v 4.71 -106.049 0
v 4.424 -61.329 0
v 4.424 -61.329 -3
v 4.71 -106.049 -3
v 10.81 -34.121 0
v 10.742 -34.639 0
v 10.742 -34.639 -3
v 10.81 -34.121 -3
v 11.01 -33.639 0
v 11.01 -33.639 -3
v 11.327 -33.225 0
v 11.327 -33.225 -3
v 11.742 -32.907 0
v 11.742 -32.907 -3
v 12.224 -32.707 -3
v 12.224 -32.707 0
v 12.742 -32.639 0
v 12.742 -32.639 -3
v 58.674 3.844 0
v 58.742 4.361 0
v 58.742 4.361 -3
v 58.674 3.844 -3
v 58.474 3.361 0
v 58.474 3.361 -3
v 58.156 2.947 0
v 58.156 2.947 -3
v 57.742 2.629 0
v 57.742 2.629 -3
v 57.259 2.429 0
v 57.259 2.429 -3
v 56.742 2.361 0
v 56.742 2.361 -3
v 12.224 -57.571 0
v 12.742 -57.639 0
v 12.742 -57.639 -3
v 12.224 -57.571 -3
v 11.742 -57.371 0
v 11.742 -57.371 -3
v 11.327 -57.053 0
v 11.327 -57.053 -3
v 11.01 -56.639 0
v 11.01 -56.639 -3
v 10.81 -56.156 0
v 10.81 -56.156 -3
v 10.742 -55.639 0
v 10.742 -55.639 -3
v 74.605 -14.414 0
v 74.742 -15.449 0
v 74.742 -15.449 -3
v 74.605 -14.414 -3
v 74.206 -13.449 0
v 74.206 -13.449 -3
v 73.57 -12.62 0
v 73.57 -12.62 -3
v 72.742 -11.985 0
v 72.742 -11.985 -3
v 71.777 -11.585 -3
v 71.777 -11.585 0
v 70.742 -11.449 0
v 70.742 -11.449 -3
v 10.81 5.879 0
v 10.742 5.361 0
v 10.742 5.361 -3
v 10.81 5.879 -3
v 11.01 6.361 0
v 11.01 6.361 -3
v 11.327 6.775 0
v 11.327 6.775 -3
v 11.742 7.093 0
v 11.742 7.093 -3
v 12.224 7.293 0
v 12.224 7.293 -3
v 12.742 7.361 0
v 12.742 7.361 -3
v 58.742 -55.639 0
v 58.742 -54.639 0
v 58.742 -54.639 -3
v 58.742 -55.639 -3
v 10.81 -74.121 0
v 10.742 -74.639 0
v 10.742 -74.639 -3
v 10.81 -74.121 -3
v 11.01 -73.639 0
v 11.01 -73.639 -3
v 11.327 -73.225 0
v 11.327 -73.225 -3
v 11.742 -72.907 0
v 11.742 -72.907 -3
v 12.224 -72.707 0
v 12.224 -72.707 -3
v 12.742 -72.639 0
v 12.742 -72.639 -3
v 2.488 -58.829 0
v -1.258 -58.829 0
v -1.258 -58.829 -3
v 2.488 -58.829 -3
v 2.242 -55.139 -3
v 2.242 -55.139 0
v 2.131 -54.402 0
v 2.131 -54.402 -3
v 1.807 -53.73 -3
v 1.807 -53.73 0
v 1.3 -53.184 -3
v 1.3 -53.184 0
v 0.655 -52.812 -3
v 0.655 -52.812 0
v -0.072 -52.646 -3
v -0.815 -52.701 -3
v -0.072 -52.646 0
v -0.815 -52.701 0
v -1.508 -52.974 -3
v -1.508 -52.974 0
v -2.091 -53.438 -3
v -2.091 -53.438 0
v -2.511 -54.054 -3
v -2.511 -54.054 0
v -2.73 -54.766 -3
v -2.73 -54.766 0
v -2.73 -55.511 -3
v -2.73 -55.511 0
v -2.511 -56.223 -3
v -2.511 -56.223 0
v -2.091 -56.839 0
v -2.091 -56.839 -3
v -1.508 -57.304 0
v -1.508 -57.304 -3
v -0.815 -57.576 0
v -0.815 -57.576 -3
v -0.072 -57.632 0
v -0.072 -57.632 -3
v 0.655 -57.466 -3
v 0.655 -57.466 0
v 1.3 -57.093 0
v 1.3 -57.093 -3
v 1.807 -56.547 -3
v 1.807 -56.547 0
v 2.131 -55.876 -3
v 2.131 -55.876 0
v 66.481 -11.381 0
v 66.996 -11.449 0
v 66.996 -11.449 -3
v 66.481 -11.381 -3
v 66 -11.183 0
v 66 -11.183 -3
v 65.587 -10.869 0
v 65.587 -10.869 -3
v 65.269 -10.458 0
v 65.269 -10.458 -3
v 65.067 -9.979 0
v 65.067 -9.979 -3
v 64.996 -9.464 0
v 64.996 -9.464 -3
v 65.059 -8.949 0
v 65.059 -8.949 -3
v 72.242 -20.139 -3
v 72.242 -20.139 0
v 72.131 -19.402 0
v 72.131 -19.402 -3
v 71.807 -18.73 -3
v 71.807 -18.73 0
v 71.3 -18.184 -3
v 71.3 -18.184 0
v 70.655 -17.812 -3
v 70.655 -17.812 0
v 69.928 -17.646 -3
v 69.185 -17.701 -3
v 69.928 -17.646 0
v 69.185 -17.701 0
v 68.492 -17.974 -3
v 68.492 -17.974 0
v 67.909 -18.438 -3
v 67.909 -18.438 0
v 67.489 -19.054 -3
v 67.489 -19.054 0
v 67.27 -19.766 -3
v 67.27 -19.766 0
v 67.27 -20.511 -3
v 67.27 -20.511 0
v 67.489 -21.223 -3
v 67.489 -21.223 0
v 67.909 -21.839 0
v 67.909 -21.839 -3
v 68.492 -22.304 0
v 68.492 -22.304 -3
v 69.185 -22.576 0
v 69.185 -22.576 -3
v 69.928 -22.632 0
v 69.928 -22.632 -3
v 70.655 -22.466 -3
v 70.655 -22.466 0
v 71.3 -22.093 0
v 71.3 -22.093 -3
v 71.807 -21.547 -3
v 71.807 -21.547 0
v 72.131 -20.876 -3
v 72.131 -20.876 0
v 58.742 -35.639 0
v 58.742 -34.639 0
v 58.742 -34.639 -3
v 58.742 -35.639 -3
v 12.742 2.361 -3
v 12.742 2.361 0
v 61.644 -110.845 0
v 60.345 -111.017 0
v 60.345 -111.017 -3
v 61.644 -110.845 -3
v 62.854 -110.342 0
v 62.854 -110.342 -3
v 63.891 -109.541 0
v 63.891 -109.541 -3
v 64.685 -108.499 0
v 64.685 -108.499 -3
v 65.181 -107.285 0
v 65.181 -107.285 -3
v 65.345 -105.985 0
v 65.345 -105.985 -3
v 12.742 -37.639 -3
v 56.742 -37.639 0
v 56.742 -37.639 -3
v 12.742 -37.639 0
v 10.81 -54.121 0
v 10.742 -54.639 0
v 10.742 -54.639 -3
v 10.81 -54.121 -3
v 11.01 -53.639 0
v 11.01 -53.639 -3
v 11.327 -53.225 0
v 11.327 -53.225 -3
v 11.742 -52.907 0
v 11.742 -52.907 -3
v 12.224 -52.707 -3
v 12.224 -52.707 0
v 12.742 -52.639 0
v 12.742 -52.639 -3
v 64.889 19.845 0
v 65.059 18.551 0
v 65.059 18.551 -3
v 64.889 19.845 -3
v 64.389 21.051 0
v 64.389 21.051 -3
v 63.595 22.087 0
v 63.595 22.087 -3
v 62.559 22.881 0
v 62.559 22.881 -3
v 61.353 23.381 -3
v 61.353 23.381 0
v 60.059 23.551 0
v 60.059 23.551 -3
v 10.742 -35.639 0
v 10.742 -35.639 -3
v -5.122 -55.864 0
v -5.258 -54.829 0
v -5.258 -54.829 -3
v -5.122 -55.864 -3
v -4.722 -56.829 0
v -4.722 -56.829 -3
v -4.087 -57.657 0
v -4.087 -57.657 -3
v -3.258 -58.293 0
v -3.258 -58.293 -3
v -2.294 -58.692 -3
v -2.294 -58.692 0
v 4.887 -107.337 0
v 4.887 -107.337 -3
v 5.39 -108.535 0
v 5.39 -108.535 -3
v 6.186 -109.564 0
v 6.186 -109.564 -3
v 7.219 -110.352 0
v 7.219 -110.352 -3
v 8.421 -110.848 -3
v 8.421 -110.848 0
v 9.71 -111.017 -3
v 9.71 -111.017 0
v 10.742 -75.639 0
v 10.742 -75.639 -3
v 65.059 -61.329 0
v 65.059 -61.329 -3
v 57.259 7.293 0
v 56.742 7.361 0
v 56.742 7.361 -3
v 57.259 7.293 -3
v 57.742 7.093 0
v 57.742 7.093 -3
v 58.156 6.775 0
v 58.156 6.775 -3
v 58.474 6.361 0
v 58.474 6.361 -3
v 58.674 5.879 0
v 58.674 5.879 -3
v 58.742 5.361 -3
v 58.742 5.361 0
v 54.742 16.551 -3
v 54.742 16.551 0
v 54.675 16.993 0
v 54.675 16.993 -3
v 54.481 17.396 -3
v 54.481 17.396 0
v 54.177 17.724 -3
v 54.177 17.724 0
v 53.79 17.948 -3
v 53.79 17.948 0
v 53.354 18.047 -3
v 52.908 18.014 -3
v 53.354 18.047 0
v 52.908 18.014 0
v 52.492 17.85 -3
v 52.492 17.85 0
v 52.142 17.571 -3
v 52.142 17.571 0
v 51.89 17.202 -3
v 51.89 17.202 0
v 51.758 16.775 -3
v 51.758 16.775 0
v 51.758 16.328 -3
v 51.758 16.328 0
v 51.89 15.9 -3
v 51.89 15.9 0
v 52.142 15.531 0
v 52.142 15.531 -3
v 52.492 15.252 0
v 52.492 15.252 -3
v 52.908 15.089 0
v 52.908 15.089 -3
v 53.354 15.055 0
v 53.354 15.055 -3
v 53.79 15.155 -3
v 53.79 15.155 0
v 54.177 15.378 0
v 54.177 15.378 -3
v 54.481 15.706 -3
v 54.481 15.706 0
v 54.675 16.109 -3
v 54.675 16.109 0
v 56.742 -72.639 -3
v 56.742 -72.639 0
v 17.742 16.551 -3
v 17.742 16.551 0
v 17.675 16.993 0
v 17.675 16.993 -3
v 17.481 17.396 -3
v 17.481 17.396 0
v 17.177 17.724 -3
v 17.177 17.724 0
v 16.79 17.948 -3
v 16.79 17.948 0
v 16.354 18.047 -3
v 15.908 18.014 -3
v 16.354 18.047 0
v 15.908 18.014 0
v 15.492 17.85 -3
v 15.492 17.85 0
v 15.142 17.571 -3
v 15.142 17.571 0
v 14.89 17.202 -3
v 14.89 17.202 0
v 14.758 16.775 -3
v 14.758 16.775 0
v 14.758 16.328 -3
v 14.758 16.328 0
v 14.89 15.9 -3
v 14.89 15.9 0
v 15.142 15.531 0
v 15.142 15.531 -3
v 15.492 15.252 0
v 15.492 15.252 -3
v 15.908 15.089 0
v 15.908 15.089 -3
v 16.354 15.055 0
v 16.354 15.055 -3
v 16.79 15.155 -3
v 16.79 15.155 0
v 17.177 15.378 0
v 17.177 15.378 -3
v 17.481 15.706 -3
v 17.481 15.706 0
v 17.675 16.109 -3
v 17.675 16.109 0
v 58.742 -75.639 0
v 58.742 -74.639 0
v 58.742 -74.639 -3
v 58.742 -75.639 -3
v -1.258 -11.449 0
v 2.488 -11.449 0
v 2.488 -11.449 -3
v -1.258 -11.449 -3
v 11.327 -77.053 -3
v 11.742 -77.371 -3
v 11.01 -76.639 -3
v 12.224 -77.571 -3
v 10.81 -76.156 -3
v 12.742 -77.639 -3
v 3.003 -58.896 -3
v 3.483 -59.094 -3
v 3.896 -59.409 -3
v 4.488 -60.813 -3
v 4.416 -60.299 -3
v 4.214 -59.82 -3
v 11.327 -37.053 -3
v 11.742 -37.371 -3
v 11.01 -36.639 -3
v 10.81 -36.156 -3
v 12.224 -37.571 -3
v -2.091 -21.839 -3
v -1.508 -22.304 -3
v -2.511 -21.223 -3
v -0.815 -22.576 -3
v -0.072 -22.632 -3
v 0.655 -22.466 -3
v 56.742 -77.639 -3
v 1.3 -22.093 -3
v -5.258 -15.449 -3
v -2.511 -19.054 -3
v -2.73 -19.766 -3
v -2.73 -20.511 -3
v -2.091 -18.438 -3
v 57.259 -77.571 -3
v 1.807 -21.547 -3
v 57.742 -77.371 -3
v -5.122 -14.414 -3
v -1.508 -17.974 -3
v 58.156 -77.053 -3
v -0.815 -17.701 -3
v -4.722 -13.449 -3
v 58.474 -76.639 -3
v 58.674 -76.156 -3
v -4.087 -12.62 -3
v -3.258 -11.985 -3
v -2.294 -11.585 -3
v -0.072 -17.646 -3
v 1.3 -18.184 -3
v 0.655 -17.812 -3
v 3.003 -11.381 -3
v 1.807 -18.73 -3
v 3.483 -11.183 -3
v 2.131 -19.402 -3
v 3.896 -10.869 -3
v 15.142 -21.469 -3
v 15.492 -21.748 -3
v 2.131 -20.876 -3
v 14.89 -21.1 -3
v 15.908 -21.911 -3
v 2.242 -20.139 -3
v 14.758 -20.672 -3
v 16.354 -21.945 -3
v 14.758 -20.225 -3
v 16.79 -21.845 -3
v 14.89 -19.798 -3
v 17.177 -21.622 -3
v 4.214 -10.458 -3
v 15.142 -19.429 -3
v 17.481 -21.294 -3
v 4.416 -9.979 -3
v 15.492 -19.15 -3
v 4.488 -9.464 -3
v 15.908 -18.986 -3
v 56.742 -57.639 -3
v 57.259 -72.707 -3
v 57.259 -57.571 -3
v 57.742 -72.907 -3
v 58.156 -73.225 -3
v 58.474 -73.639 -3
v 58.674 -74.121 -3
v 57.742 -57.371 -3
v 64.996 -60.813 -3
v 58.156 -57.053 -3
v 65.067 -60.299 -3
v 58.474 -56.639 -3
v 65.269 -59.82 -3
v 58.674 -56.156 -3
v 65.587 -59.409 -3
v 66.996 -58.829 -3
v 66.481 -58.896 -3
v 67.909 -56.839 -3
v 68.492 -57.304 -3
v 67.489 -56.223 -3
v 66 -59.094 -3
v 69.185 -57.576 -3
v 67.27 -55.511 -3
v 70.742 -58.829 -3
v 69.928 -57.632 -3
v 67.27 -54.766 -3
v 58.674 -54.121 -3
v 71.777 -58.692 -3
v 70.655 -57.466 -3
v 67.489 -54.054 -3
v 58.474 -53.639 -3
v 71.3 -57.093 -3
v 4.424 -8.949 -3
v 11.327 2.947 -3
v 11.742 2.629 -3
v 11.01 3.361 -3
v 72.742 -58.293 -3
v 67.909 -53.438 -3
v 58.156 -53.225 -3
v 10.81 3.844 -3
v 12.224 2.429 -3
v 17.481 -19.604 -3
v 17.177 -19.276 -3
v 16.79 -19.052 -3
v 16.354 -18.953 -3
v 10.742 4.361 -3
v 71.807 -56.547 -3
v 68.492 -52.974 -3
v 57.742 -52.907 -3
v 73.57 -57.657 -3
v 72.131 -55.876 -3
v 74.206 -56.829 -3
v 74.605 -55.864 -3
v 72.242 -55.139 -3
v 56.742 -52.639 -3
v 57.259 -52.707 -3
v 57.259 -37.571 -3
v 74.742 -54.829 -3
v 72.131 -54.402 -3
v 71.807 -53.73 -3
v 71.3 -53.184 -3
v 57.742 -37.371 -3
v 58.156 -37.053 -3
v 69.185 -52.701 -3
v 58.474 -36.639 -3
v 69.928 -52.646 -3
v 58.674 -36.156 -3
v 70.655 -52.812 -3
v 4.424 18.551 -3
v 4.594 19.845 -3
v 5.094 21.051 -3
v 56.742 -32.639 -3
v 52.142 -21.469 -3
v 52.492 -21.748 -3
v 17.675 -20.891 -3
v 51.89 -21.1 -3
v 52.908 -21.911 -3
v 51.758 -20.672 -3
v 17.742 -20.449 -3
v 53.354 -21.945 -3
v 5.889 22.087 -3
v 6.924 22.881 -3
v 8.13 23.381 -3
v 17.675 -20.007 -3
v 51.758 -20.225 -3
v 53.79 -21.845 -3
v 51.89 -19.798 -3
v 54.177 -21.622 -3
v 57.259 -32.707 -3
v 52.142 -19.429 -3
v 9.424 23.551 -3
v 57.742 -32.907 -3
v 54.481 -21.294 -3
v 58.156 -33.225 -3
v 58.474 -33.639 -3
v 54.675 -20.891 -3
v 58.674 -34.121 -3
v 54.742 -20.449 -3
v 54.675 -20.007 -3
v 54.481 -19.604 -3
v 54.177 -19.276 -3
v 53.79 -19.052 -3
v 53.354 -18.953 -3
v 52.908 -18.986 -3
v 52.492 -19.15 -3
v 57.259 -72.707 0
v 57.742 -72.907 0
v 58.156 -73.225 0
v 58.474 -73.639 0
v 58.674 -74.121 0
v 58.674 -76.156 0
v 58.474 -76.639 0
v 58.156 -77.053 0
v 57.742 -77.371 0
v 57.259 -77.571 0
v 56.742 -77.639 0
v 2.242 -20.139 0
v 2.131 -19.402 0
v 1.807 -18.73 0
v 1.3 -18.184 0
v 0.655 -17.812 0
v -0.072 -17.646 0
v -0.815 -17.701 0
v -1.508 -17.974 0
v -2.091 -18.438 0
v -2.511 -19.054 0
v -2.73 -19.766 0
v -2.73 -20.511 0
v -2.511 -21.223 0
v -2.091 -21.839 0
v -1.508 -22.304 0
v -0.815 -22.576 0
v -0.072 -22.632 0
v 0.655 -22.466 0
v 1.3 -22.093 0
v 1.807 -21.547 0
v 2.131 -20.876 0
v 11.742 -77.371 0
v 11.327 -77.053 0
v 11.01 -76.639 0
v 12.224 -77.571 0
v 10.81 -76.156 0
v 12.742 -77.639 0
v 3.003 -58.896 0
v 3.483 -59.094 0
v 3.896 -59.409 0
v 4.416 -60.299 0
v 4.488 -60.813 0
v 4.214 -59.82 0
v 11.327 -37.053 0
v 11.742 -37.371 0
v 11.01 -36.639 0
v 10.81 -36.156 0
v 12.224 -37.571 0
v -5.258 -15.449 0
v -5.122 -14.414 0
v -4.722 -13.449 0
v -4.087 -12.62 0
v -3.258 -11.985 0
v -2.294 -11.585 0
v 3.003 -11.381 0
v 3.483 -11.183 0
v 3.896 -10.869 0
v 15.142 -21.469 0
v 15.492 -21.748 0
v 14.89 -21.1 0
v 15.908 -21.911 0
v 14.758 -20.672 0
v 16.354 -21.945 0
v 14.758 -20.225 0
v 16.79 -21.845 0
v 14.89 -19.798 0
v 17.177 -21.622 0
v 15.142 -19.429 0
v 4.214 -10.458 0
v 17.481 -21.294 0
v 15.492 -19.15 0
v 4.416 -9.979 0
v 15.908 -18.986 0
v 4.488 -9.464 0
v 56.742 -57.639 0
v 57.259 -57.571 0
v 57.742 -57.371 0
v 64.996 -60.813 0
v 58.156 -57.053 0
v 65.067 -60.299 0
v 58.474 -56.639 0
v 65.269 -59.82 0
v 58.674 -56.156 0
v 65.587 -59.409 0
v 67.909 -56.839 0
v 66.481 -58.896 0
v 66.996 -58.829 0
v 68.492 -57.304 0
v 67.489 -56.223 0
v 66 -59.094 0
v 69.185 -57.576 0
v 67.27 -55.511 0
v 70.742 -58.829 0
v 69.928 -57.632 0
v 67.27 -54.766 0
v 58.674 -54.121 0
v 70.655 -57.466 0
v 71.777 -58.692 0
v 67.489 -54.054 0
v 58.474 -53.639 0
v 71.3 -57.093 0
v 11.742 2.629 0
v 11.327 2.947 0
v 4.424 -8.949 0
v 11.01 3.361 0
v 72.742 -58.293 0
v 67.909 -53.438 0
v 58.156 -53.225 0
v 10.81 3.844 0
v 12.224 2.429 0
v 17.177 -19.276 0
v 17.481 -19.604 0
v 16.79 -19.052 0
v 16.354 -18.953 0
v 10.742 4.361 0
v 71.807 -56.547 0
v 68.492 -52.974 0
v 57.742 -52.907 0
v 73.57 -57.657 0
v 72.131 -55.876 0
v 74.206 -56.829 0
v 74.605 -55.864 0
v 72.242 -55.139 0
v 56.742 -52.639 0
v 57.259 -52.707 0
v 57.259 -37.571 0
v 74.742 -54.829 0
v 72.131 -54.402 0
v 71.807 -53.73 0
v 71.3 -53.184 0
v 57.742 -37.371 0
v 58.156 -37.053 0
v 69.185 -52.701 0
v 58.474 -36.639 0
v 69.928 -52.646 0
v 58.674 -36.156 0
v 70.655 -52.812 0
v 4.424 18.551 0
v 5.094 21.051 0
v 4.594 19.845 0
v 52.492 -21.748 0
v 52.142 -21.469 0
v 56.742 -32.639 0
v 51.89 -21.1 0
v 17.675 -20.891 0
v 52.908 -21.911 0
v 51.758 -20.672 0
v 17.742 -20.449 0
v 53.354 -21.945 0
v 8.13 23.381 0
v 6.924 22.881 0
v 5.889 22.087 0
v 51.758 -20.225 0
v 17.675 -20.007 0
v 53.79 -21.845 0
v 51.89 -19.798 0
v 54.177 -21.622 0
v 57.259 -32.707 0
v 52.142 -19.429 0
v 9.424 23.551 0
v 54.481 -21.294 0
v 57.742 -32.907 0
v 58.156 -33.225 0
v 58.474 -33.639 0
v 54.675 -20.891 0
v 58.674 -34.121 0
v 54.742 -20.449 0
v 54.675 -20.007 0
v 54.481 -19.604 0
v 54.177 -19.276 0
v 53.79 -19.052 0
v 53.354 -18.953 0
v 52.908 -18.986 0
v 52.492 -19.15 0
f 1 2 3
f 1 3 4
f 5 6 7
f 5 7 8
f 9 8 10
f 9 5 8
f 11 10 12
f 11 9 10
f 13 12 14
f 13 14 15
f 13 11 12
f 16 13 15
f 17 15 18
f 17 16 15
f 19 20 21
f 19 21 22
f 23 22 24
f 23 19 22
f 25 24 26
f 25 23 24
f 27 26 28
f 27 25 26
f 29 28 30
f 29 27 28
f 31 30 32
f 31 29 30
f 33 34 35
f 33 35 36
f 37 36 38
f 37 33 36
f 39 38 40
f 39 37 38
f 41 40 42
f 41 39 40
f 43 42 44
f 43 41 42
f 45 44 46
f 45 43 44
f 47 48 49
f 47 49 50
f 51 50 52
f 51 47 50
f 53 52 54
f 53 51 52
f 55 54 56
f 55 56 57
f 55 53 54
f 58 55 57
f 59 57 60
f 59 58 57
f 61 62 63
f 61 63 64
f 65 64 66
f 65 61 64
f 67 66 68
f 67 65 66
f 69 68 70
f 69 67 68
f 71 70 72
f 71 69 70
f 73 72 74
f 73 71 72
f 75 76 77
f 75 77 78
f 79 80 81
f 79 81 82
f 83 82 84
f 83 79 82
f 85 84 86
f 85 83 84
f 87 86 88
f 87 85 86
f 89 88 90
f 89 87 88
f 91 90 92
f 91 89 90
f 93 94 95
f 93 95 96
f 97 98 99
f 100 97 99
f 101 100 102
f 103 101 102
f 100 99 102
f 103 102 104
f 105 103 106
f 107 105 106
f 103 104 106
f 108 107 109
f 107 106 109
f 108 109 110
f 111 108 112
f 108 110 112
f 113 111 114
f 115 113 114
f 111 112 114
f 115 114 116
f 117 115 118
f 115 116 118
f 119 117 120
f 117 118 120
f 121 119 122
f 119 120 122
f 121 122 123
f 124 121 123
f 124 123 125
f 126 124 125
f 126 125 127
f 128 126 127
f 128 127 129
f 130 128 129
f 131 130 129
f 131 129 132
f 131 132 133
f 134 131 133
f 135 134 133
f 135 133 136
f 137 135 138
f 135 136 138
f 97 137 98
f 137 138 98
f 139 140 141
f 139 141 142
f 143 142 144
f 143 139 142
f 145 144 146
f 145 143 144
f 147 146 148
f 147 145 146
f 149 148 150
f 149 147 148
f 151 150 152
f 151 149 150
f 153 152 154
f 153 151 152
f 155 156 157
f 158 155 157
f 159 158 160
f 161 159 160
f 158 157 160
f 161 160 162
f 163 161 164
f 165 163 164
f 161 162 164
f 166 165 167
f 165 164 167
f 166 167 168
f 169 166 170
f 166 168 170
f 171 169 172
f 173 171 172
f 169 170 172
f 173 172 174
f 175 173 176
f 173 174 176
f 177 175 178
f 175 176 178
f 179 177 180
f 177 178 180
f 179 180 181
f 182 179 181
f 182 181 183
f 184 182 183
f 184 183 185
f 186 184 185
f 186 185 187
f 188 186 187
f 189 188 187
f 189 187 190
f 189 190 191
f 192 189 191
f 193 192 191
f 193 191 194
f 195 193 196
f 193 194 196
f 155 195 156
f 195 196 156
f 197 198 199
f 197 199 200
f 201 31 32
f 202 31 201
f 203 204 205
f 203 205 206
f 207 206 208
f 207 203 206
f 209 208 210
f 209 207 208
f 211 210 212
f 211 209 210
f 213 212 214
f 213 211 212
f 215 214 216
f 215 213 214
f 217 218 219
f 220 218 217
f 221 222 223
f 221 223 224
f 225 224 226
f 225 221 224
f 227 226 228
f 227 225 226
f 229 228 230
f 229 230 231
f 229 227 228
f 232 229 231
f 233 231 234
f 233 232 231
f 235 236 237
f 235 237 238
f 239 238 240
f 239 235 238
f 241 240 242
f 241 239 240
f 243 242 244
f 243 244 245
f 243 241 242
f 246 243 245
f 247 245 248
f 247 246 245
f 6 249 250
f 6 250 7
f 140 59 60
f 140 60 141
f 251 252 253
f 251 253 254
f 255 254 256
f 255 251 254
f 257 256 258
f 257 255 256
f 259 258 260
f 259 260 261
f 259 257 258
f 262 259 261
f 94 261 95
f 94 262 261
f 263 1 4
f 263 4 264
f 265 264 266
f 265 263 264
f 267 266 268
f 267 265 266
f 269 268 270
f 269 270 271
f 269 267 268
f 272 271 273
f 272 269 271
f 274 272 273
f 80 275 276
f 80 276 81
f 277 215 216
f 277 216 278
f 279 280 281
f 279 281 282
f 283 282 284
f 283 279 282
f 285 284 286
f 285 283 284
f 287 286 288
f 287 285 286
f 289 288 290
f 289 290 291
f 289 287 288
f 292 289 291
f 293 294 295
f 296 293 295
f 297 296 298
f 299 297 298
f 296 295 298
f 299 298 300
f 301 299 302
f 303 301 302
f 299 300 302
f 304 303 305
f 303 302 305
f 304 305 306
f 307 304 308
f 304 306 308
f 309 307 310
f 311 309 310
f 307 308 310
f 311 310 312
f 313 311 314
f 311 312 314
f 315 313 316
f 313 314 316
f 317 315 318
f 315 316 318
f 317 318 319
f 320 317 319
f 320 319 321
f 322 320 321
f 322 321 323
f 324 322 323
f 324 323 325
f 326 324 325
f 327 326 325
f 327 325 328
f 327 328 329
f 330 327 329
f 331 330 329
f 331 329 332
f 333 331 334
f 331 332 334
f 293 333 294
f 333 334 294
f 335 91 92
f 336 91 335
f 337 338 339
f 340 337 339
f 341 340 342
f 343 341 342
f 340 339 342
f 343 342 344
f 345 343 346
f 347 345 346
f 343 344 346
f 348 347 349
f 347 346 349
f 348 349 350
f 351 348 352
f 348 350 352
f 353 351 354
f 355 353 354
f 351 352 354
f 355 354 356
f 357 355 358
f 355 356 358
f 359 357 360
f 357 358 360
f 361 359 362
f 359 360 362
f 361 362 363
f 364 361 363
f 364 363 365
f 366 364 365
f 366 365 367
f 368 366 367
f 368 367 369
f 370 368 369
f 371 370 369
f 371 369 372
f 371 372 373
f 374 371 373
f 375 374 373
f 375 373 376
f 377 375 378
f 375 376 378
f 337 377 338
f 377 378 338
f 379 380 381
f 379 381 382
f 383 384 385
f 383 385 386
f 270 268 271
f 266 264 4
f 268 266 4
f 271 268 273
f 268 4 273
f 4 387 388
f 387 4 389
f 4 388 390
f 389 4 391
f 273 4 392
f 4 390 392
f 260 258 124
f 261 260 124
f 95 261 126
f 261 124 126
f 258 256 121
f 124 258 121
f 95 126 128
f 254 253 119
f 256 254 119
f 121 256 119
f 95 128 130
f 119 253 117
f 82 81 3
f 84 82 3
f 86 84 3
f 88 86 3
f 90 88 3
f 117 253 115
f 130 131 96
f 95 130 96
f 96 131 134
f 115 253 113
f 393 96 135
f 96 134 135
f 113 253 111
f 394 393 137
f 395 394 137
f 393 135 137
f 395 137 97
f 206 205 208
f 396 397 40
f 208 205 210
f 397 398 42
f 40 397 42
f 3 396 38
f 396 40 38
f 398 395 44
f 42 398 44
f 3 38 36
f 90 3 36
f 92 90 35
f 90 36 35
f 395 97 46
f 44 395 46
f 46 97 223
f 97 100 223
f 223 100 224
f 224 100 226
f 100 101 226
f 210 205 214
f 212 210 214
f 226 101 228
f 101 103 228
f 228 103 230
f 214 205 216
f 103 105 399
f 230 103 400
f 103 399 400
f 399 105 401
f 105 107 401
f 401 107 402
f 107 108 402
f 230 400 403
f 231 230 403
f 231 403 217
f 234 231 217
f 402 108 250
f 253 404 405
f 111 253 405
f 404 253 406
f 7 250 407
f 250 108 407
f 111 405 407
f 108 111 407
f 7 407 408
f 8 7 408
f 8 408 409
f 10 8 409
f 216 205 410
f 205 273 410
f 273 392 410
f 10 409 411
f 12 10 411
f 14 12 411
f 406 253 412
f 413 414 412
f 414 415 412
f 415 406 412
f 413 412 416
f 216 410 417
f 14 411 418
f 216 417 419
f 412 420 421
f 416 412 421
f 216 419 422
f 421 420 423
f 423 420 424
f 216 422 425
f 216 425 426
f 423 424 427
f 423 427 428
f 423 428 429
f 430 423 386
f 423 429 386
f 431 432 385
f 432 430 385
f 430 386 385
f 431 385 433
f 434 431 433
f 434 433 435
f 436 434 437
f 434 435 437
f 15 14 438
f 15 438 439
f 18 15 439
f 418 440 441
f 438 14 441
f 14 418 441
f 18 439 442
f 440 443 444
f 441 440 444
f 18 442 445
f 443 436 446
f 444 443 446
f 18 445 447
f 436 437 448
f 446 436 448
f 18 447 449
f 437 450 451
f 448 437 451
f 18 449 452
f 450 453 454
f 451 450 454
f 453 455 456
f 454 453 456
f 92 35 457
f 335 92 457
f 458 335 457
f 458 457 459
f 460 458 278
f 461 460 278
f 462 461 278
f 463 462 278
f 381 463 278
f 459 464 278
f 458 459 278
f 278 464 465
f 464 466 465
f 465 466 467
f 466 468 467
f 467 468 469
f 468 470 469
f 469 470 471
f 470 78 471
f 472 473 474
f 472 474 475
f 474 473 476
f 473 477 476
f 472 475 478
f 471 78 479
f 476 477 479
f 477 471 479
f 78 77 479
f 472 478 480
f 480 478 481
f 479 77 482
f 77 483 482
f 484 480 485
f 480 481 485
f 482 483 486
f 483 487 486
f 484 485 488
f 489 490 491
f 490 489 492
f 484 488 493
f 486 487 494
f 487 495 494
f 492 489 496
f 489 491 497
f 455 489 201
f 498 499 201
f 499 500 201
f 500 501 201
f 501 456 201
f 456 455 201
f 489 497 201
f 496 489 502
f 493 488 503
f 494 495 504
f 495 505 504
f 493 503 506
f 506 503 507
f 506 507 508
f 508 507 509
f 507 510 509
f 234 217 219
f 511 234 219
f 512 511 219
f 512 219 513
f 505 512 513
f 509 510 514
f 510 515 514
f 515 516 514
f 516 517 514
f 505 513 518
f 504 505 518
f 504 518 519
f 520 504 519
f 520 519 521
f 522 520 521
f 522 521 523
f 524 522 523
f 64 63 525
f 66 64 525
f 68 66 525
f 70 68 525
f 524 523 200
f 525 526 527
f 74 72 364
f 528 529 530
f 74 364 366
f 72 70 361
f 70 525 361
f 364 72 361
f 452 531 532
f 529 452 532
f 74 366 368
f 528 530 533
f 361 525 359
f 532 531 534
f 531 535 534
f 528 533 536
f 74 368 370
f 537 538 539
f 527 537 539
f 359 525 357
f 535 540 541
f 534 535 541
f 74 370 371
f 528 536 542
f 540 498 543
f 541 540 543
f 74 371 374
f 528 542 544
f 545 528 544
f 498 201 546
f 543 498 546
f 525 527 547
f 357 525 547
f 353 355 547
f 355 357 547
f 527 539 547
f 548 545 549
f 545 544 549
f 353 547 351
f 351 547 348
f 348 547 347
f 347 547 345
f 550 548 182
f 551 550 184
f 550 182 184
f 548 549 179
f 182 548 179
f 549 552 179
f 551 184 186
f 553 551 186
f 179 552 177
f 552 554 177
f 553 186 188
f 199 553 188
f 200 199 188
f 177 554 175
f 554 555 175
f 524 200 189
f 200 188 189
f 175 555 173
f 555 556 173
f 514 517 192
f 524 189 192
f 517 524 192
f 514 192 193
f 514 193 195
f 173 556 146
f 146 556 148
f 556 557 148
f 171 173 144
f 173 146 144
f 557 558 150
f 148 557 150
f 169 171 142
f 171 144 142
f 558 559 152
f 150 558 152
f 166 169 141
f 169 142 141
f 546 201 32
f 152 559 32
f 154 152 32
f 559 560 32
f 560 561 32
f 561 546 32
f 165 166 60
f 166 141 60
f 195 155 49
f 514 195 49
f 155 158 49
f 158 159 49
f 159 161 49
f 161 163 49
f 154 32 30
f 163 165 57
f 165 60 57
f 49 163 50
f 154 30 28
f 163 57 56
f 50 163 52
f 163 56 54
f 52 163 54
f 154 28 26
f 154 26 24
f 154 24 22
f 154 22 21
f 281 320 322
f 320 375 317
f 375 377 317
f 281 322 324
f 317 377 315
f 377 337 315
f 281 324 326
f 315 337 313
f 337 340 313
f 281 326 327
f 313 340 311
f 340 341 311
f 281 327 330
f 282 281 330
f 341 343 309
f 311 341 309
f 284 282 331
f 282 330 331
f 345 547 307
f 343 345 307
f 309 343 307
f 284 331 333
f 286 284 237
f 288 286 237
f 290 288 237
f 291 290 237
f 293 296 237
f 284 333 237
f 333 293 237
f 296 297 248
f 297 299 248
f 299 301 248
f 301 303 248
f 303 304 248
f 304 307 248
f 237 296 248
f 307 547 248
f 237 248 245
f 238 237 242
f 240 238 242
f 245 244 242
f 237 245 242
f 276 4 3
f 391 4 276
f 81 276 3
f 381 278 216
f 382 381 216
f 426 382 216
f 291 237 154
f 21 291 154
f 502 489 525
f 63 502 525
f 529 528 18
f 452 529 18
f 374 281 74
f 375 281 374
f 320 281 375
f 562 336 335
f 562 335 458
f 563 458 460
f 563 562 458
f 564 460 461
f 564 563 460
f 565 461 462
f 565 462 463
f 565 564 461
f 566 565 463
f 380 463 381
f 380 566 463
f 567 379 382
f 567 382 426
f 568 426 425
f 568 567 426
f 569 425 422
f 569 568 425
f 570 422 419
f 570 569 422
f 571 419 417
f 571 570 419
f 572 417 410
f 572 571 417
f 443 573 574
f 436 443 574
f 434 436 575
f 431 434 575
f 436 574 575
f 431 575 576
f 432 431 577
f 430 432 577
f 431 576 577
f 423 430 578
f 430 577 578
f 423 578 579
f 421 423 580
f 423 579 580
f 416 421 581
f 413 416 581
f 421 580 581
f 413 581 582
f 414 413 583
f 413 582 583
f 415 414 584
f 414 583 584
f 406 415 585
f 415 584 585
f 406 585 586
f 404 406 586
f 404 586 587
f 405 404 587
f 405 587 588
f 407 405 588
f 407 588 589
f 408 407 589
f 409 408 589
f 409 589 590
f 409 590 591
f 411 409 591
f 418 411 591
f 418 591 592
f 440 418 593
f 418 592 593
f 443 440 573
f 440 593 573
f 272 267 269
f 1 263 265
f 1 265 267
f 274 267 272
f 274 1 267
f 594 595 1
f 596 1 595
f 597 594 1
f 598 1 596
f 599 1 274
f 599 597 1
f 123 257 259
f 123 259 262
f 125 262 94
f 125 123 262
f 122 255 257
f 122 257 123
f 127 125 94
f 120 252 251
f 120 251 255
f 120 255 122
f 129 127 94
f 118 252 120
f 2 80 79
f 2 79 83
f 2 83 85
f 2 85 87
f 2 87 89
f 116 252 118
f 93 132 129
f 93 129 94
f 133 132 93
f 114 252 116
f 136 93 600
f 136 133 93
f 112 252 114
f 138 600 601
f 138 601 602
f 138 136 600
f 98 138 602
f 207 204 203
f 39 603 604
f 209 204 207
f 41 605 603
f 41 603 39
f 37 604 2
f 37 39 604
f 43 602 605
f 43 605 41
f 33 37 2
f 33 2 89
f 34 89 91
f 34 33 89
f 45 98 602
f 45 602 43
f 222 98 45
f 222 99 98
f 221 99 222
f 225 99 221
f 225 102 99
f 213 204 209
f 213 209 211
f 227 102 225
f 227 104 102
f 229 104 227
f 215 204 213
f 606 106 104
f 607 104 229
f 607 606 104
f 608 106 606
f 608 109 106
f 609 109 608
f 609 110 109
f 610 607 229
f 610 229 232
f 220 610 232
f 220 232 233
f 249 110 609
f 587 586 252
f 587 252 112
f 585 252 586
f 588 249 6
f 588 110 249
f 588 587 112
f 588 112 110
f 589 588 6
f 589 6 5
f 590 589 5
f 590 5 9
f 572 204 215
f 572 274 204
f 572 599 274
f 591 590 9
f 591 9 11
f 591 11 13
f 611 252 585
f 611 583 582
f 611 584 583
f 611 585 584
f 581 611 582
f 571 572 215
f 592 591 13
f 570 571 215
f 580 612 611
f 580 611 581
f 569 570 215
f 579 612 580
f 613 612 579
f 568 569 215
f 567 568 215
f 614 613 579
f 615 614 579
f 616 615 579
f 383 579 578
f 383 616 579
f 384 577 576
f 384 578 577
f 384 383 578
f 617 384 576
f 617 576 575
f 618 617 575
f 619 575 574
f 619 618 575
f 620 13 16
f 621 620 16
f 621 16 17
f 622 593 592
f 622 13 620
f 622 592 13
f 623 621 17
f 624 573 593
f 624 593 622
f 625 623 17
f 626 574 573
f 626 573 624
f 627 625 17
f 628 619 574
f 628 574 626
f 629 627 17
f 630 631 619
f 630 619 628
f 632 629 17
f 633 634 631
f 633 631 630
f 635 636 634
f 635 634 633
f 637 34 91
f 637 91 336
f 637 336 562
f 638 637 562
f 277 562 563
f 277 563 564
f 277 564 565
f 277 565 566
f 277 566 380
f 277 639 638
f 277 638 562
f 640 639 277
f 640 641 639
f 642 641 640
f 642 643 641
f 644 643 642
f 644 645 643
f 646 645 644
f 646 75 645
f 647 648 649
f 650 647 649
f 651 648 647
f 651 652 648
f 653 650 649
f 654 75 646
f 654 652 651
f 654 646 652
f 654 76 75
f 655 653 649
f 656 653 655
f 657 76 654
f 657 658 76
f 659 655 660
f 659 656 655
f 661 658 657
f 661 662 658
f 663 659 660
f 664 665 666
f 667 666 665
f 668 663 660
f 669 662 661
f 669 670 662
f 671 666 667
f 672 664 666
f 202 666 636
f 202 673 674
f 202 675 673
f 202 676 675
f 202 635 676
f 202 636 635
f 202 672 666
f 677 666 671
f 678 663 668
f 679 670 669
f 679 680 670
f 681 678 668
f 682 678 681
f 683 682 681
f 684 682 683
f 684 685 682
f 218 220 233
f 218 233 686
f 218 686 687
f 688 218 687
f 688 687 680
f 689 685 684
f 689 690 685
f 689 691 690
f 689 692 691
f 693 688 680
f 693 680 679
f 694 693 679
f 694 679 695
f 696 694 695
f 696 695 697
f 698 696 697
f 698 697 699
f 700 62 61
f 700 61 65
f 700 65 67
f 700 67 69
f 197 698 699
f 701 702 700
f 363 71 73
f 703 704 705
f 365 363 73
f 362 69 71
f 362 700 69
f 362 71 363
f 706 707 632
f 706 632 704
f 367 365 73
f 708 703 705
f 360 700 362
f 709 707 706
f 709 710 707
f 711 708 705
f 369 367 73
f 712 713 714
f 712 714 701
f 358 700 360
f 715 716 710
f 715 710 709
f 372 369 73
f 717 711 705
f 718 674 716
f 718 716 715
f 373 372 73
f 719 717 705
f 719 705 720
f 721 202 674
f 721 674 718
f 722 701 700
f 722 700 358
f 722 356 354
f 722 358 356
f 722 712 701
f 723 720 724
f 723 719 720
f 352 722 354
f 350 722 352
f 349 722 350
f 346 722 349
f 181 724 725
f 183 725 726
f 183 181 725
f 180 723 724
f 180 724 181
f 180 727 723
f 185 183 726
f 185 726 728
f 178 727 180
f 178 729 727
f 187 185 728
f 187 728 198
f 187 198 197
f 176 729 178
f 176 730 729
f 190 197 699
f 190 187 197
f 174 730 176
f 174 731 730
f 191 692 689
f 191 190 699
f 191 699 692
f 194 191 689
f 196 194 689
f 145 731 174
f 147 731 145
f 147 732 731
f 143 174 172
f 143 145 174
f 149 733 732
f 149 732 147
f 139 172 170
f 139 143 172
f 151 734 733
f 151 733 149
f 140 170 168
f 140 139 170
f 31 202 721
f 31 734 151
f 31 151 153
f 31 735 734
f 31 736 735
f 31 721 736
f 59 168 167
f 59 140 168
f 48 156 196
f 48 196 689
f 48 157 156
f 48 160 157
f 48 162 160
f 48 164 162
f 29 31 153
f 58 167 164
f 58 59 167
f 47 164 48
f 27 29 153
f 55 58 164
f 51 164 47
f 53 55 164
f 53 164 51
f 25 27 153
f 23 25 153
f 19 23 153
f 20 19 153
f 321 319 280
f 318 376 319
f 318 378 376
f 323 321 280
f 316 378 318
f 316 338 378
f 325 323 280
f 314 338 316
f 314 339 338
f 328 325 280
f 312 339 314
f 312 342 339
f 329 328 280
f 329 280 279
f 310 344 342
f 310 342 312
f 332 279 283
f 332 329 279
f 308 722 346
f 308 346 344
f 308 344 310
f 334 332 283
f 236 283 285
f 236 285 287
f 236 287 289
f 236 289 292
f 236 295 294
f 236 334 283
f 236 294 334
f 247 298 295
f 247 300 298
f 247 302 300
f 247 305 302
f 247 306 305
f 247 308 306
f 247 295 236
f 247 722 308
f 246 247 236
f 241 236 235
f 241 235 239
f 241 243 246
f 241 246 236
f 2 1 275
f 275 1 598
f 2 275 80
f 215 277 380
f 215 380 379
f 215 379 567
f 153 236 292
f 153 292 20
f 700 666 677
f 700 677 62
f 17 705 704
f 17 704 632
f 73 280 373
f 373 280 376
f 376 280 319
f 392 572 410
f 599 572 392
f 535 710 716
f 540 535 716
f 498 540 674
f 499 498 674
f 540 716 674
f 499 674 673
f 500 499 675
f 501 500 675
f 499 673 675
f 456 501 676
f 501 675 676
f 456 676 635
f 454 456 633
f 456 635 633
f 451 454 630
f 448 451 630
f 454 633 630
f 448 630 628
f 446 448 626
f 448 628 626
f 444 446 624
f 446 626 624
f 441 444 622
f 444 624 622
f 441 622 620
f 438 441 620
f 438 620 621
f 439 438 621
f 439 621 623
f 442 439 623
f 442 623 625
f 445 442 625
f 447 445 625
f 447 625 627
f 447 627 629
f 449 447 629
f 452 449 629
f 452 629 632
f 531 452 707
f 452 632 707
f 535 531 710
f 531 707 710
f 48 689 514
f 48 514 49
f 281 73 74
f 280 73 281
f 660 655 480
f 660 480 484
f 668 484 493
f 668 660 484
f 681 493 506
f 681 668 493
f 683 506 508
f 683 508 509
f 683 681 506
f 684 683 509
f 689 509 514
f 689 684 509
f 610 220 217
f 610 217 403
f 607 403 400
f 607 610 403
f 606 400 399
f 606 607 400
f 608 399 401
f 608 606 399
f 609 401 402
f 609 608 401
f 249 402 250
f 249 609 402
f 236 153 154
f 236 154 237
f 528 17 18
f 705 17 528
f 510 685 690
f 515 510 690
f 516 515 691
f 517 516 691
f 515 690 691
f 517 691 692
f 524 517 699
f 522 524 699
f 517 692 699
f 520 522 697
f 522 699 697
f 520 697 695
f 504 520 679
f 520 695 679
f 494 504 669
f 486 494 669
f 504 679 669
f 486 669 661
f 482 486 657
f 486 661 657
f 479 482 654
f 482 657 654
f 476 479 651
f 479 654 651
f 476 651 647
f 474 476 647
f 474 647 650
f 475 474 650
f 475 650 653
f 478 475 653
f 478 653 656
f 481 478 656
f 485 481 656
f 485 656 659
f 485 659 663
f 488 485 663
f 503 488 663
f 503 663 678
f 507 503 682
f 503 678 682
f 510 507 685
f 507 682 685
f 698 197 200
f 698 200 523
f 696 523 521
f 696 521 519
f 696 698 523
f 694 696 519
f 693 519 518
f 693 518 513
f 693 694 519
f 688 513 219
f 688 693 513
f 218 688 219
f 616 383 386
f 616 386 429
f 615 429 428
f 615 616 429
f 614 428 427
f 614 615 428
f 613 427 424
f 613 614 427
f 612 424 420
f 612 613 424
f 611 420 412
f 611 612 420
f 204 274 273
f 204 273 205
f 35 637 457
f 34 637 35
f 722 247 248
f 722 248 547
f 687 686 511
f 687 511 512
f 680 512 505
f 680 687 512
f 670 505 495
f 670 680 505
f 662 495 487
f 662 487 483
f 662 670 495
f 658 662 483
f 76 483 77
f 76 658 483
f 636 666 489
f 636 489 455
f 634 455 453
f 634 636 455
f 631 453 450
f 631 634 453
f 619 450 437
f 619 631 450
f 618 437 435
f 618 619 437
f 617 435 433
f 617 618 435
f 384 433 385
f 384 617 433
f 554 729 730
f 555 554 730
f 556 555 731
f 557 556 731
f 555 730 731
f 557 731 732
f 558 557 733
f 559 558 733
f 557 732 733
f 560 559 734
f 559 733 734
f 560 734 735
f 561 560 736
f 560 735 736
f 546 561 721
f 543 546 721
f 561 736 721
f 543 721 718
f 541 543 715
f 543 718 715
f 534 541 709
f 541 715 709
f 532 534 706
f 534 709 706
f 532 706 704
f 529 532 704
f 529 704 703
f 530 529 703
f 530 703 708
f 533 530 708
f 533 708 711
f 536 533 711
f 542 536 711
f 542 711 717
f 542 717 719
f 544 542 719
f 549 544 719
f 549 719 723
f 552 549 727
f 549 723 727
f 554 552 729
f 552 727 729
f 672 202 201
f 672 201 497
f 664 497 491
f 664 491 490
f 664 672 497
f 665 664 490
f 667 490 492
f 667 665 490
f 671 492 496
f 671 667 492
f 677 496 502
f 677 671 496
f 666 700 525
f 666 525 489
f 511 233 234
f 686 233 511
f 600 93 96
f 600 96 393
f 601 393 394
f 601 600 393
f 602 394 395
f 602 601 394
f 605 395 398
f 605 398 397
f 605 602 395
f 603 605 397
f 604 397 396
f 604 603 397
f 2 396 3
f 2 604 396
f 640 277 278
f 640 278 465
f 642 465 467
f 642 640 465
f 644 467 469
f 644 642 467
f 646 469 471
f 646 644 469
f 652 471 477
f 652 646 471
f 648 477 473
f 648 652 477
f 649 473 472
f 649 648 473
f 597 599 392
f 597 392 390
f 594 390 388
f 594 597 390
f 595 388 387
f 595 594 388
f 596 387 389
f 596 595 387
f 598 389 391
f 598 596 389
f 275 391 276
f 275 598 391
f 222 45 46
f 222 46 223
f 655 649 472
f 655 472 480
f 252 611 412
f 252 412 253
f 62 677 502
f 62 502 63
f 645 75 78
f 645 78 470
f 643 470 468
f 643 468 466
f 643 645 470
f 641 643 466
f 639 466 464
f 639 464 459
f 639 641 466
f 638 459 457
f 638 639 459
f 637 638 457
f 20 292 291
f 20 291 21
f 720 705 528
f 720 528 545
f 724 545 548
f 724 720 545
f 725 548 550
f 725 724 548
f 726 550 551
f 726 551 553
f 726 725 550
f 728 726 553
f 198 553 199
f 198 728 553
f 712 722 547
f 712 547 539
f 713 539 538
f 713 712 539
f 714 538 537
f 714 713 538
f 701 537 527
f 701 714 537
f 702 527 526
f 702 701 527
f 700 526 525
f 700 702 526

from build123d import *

# Parameters (mm, degrees)
F0_R     = 2.5
F0_R_2   = 1.5
F1_DEPTH = 3


with BuildPart() as f1:
    # F0 (on Top) → F1 (new body)
    with BuildSketch(Plane.XY):
        with BuildLine():
            ThreePointArc((4.42411, -8.948789), (4.068757, -10.673534), (2.487618, -11.448789))
            Line((2.487618, -11.448789), (-1.258349, -11.448789))
            ThreePointArc((-1.258349, -11.448789), (-4.086776, -12.620362), (-5.258349, -15.448789))
            Line((-5.258349, -15.448789), (-5.258349, -54.828789))
            ThreePointArc((-5.258349, -54.828789), (-4.086776, -57.657216), (-1.258349, -58.828789))
            Line((-1.258349, -58.828789), (2.487618, -58.828789))
            ThreePointArc((2.487618, -58.828789), (4.068757, -59.604044), (4.42411, -61.328789))
            Line((4.42411, -61.328789), (4.709902, -106.048986))
            ThreePointArc((4.709902, -106.048986), (6.185581, -109.563846), (9.7098, -111.017033))
            Line((9.7098, -111.017033), (60.344679, -111.017033))
            ThreePointArc((60.344679, -111.017033), (63.891492, -109.541252), (65.344577, -105.985081))
            Line((65.344577, -105.985081), (65.059193, -61.328789))
            ThreePointArc((65.059193, -61.328789), (65.414546, -59.604044), (66.995685, -58.828789))
            Line((66.995685, -58.828789), (70.741651, -58.828789))
            ThreePointArc((70.741651, -58.828789), (73.570078, -57.657216), (74.741651, -54.828789))
            Line((74.741651, -54.828789), (74.741651, -15.448789))
            ThreePointArc((74.741651, -15.448789), (73.570078, -12.620362), (70.741651, -11.448789))
            Line((70.741651, -11.448789), (66.995685, -11.448789))
            ThreePointArc((66.995685, -11.448789), (65.414546, -10.673534), (65.059193, -8.948789))
            Line((65.059193, -8.948789), (65.059193, 18.551211))
            ThreePointArc((65.059193, 18.551211), (63.594727, 22.086745), (60.059193, 23.551211))
            Line((60.059193, 23.551211), (9.42411, 23.551211))
            ThreePointArc((9.42411, 23.551211), (5.888576, 22.086745), (4.42411, 18.551211))
            Line((4.42411, 18.551211), (4.42411, -8.948789))
        make_face()
        with Locations((-0.258349, -55.138789)):
            Circle(F0_R, mode=Mode.SUBTRACT)
        with BuildLine():
            ThreePointArc((10.741651, -74.638789), (11.327438, -73.224575), (12.741651, -72.638789))
            Line((12.741651, -72.638789), (56.741651, -72.638789))
            ThreePointArc((56.741651, -72.638789), (58.155865, -73.224575), (58.741651, -74.638789))
            Line((58.741651, -74.638789), (58.741651, -75.638789))
            ThreePointArc((58.741651, -75.638789), (58.155865, -77.053002), (56.741651, -77.638789))
            Line((56.741651, -77.638789), (12.741651, -77.638789))
            ThreePointArc((12.741651, -77.638789), (11.327438, -77.053002), (10.741651, -75.638789))
            Line((10.741651, -75.638789), (10.741651, -74.638789))
        make_face(mode=Mode.SUBTRACT)
        with BuildLine():
            Line((56.741651, -57.638789), (12.741651, -57.638789))
            ThreePointArc((12.741651, -57.638789), (11.327438, -57.053002), (10.741651, -55.638789))
            Line((10.741651, -55.638789), (10.741651, -54.638789))
            ThreePointArc((10.741651, -54.638789), (11.327438, -53.224575), (12.741651, -52.638789))
            Line((12.741651, -52.638789), (56.741651, -52.638789))
            ThreePointArc((56.741651, -52.638789), (58.155865, -53.224575), (58.741651, -54.638789))
            Line((58.741651, -54.638789), (58.741651, -55.638789))
            ThreePointArc((58.741651, -55.638789), (58.155865, -57.053002), (56.741651, -57.638789))
        make_face(mode=Mode.SUBTRACT)
        with Locations((69.741651, -55.138789)):
            Circle(F0_R, mode=Mode.SUBTRACT)
        with Locations((-0.258349, -20.138789)):
            Circle(F0_R, mode=Mode.SUBTRACT)
        with Locations((16.241651, -20.448789)):
            Circle(F0_R_2, mode=Mode.SUBTRACT)
        with Locations((16.241651, 16.551211)):
            Circle(F0_R_2, mode=Mode.SUBTRACT)
        with BuildLine():
            Line((12.741651, -32.638789), (56.741651, -32.638789))
            ThreePointArc((56.741651, -32.638789), (58.155865, -33.224575), (58.741651, -34.638789))
            Line((58.741651, -34.638789), (58.741651, -35.638789))
            ThreePointArc((58.741651, -35.638789), (58.155865, -37.053002), (56.741651, -37.638789))
            Line((56.741651, -37.638789), (12.741651, -37.638789))
            ThreePointArc((12.741651, -37.638789), (11.327438, -37.053002), (10.741651, -35.638789))
            Line((10.741651, -35.638789), (10.741651, -34.638789))
            ThreePointArc((10.741651, -34.638789), (11.327438, -33.224575), (12.741651, -32.638789))
        make_face(mode=Mode.SUBTRACT)
        with Locations((53.241651, -20.448789)):
            Circle(F0_R_2, mode=Mode.SUBTRACT)
        with Locations((69.741651, -20.138789)):
            Circle(F0_R, mode=Mode.SUBTRACT)
        with BuildLine():
            Line((56.741651, 2.361211), (12.741651, 2.361211))
            ThreePointArc((12.741651, 2.361211), (11.327438, 2.946998), (10.741651, 4.361211))
            Line((10.741651, 4.361211), (10.741651, 5.361211))
            ThreePointArc((10.741651, 5.361211), (11.327438, 6.775425), (12.741651, 7.361211))
            Line((12.741651, 7.361211), (56.741651, 7.361211))
            ThreePointArc((56.741651, 7.361211), (58.155865, 6.775425), (58.741651, 5.361211))
            Line((58.741651, 5.361211), (58.741651, 4.361211))
            ThreePointArc((58.741651, 4.361211), (58.155865, 2.946998), (56.741651, 2.361211))
        make_face(mode=Mode.SUBTRACT)
        with Locations((53.241651, 16.551211)):
            Circle(F0_R_2, mode=Mode.SUBTRACT)
    extrude(amount=-F1_DEPTH)


solid = f1.part
